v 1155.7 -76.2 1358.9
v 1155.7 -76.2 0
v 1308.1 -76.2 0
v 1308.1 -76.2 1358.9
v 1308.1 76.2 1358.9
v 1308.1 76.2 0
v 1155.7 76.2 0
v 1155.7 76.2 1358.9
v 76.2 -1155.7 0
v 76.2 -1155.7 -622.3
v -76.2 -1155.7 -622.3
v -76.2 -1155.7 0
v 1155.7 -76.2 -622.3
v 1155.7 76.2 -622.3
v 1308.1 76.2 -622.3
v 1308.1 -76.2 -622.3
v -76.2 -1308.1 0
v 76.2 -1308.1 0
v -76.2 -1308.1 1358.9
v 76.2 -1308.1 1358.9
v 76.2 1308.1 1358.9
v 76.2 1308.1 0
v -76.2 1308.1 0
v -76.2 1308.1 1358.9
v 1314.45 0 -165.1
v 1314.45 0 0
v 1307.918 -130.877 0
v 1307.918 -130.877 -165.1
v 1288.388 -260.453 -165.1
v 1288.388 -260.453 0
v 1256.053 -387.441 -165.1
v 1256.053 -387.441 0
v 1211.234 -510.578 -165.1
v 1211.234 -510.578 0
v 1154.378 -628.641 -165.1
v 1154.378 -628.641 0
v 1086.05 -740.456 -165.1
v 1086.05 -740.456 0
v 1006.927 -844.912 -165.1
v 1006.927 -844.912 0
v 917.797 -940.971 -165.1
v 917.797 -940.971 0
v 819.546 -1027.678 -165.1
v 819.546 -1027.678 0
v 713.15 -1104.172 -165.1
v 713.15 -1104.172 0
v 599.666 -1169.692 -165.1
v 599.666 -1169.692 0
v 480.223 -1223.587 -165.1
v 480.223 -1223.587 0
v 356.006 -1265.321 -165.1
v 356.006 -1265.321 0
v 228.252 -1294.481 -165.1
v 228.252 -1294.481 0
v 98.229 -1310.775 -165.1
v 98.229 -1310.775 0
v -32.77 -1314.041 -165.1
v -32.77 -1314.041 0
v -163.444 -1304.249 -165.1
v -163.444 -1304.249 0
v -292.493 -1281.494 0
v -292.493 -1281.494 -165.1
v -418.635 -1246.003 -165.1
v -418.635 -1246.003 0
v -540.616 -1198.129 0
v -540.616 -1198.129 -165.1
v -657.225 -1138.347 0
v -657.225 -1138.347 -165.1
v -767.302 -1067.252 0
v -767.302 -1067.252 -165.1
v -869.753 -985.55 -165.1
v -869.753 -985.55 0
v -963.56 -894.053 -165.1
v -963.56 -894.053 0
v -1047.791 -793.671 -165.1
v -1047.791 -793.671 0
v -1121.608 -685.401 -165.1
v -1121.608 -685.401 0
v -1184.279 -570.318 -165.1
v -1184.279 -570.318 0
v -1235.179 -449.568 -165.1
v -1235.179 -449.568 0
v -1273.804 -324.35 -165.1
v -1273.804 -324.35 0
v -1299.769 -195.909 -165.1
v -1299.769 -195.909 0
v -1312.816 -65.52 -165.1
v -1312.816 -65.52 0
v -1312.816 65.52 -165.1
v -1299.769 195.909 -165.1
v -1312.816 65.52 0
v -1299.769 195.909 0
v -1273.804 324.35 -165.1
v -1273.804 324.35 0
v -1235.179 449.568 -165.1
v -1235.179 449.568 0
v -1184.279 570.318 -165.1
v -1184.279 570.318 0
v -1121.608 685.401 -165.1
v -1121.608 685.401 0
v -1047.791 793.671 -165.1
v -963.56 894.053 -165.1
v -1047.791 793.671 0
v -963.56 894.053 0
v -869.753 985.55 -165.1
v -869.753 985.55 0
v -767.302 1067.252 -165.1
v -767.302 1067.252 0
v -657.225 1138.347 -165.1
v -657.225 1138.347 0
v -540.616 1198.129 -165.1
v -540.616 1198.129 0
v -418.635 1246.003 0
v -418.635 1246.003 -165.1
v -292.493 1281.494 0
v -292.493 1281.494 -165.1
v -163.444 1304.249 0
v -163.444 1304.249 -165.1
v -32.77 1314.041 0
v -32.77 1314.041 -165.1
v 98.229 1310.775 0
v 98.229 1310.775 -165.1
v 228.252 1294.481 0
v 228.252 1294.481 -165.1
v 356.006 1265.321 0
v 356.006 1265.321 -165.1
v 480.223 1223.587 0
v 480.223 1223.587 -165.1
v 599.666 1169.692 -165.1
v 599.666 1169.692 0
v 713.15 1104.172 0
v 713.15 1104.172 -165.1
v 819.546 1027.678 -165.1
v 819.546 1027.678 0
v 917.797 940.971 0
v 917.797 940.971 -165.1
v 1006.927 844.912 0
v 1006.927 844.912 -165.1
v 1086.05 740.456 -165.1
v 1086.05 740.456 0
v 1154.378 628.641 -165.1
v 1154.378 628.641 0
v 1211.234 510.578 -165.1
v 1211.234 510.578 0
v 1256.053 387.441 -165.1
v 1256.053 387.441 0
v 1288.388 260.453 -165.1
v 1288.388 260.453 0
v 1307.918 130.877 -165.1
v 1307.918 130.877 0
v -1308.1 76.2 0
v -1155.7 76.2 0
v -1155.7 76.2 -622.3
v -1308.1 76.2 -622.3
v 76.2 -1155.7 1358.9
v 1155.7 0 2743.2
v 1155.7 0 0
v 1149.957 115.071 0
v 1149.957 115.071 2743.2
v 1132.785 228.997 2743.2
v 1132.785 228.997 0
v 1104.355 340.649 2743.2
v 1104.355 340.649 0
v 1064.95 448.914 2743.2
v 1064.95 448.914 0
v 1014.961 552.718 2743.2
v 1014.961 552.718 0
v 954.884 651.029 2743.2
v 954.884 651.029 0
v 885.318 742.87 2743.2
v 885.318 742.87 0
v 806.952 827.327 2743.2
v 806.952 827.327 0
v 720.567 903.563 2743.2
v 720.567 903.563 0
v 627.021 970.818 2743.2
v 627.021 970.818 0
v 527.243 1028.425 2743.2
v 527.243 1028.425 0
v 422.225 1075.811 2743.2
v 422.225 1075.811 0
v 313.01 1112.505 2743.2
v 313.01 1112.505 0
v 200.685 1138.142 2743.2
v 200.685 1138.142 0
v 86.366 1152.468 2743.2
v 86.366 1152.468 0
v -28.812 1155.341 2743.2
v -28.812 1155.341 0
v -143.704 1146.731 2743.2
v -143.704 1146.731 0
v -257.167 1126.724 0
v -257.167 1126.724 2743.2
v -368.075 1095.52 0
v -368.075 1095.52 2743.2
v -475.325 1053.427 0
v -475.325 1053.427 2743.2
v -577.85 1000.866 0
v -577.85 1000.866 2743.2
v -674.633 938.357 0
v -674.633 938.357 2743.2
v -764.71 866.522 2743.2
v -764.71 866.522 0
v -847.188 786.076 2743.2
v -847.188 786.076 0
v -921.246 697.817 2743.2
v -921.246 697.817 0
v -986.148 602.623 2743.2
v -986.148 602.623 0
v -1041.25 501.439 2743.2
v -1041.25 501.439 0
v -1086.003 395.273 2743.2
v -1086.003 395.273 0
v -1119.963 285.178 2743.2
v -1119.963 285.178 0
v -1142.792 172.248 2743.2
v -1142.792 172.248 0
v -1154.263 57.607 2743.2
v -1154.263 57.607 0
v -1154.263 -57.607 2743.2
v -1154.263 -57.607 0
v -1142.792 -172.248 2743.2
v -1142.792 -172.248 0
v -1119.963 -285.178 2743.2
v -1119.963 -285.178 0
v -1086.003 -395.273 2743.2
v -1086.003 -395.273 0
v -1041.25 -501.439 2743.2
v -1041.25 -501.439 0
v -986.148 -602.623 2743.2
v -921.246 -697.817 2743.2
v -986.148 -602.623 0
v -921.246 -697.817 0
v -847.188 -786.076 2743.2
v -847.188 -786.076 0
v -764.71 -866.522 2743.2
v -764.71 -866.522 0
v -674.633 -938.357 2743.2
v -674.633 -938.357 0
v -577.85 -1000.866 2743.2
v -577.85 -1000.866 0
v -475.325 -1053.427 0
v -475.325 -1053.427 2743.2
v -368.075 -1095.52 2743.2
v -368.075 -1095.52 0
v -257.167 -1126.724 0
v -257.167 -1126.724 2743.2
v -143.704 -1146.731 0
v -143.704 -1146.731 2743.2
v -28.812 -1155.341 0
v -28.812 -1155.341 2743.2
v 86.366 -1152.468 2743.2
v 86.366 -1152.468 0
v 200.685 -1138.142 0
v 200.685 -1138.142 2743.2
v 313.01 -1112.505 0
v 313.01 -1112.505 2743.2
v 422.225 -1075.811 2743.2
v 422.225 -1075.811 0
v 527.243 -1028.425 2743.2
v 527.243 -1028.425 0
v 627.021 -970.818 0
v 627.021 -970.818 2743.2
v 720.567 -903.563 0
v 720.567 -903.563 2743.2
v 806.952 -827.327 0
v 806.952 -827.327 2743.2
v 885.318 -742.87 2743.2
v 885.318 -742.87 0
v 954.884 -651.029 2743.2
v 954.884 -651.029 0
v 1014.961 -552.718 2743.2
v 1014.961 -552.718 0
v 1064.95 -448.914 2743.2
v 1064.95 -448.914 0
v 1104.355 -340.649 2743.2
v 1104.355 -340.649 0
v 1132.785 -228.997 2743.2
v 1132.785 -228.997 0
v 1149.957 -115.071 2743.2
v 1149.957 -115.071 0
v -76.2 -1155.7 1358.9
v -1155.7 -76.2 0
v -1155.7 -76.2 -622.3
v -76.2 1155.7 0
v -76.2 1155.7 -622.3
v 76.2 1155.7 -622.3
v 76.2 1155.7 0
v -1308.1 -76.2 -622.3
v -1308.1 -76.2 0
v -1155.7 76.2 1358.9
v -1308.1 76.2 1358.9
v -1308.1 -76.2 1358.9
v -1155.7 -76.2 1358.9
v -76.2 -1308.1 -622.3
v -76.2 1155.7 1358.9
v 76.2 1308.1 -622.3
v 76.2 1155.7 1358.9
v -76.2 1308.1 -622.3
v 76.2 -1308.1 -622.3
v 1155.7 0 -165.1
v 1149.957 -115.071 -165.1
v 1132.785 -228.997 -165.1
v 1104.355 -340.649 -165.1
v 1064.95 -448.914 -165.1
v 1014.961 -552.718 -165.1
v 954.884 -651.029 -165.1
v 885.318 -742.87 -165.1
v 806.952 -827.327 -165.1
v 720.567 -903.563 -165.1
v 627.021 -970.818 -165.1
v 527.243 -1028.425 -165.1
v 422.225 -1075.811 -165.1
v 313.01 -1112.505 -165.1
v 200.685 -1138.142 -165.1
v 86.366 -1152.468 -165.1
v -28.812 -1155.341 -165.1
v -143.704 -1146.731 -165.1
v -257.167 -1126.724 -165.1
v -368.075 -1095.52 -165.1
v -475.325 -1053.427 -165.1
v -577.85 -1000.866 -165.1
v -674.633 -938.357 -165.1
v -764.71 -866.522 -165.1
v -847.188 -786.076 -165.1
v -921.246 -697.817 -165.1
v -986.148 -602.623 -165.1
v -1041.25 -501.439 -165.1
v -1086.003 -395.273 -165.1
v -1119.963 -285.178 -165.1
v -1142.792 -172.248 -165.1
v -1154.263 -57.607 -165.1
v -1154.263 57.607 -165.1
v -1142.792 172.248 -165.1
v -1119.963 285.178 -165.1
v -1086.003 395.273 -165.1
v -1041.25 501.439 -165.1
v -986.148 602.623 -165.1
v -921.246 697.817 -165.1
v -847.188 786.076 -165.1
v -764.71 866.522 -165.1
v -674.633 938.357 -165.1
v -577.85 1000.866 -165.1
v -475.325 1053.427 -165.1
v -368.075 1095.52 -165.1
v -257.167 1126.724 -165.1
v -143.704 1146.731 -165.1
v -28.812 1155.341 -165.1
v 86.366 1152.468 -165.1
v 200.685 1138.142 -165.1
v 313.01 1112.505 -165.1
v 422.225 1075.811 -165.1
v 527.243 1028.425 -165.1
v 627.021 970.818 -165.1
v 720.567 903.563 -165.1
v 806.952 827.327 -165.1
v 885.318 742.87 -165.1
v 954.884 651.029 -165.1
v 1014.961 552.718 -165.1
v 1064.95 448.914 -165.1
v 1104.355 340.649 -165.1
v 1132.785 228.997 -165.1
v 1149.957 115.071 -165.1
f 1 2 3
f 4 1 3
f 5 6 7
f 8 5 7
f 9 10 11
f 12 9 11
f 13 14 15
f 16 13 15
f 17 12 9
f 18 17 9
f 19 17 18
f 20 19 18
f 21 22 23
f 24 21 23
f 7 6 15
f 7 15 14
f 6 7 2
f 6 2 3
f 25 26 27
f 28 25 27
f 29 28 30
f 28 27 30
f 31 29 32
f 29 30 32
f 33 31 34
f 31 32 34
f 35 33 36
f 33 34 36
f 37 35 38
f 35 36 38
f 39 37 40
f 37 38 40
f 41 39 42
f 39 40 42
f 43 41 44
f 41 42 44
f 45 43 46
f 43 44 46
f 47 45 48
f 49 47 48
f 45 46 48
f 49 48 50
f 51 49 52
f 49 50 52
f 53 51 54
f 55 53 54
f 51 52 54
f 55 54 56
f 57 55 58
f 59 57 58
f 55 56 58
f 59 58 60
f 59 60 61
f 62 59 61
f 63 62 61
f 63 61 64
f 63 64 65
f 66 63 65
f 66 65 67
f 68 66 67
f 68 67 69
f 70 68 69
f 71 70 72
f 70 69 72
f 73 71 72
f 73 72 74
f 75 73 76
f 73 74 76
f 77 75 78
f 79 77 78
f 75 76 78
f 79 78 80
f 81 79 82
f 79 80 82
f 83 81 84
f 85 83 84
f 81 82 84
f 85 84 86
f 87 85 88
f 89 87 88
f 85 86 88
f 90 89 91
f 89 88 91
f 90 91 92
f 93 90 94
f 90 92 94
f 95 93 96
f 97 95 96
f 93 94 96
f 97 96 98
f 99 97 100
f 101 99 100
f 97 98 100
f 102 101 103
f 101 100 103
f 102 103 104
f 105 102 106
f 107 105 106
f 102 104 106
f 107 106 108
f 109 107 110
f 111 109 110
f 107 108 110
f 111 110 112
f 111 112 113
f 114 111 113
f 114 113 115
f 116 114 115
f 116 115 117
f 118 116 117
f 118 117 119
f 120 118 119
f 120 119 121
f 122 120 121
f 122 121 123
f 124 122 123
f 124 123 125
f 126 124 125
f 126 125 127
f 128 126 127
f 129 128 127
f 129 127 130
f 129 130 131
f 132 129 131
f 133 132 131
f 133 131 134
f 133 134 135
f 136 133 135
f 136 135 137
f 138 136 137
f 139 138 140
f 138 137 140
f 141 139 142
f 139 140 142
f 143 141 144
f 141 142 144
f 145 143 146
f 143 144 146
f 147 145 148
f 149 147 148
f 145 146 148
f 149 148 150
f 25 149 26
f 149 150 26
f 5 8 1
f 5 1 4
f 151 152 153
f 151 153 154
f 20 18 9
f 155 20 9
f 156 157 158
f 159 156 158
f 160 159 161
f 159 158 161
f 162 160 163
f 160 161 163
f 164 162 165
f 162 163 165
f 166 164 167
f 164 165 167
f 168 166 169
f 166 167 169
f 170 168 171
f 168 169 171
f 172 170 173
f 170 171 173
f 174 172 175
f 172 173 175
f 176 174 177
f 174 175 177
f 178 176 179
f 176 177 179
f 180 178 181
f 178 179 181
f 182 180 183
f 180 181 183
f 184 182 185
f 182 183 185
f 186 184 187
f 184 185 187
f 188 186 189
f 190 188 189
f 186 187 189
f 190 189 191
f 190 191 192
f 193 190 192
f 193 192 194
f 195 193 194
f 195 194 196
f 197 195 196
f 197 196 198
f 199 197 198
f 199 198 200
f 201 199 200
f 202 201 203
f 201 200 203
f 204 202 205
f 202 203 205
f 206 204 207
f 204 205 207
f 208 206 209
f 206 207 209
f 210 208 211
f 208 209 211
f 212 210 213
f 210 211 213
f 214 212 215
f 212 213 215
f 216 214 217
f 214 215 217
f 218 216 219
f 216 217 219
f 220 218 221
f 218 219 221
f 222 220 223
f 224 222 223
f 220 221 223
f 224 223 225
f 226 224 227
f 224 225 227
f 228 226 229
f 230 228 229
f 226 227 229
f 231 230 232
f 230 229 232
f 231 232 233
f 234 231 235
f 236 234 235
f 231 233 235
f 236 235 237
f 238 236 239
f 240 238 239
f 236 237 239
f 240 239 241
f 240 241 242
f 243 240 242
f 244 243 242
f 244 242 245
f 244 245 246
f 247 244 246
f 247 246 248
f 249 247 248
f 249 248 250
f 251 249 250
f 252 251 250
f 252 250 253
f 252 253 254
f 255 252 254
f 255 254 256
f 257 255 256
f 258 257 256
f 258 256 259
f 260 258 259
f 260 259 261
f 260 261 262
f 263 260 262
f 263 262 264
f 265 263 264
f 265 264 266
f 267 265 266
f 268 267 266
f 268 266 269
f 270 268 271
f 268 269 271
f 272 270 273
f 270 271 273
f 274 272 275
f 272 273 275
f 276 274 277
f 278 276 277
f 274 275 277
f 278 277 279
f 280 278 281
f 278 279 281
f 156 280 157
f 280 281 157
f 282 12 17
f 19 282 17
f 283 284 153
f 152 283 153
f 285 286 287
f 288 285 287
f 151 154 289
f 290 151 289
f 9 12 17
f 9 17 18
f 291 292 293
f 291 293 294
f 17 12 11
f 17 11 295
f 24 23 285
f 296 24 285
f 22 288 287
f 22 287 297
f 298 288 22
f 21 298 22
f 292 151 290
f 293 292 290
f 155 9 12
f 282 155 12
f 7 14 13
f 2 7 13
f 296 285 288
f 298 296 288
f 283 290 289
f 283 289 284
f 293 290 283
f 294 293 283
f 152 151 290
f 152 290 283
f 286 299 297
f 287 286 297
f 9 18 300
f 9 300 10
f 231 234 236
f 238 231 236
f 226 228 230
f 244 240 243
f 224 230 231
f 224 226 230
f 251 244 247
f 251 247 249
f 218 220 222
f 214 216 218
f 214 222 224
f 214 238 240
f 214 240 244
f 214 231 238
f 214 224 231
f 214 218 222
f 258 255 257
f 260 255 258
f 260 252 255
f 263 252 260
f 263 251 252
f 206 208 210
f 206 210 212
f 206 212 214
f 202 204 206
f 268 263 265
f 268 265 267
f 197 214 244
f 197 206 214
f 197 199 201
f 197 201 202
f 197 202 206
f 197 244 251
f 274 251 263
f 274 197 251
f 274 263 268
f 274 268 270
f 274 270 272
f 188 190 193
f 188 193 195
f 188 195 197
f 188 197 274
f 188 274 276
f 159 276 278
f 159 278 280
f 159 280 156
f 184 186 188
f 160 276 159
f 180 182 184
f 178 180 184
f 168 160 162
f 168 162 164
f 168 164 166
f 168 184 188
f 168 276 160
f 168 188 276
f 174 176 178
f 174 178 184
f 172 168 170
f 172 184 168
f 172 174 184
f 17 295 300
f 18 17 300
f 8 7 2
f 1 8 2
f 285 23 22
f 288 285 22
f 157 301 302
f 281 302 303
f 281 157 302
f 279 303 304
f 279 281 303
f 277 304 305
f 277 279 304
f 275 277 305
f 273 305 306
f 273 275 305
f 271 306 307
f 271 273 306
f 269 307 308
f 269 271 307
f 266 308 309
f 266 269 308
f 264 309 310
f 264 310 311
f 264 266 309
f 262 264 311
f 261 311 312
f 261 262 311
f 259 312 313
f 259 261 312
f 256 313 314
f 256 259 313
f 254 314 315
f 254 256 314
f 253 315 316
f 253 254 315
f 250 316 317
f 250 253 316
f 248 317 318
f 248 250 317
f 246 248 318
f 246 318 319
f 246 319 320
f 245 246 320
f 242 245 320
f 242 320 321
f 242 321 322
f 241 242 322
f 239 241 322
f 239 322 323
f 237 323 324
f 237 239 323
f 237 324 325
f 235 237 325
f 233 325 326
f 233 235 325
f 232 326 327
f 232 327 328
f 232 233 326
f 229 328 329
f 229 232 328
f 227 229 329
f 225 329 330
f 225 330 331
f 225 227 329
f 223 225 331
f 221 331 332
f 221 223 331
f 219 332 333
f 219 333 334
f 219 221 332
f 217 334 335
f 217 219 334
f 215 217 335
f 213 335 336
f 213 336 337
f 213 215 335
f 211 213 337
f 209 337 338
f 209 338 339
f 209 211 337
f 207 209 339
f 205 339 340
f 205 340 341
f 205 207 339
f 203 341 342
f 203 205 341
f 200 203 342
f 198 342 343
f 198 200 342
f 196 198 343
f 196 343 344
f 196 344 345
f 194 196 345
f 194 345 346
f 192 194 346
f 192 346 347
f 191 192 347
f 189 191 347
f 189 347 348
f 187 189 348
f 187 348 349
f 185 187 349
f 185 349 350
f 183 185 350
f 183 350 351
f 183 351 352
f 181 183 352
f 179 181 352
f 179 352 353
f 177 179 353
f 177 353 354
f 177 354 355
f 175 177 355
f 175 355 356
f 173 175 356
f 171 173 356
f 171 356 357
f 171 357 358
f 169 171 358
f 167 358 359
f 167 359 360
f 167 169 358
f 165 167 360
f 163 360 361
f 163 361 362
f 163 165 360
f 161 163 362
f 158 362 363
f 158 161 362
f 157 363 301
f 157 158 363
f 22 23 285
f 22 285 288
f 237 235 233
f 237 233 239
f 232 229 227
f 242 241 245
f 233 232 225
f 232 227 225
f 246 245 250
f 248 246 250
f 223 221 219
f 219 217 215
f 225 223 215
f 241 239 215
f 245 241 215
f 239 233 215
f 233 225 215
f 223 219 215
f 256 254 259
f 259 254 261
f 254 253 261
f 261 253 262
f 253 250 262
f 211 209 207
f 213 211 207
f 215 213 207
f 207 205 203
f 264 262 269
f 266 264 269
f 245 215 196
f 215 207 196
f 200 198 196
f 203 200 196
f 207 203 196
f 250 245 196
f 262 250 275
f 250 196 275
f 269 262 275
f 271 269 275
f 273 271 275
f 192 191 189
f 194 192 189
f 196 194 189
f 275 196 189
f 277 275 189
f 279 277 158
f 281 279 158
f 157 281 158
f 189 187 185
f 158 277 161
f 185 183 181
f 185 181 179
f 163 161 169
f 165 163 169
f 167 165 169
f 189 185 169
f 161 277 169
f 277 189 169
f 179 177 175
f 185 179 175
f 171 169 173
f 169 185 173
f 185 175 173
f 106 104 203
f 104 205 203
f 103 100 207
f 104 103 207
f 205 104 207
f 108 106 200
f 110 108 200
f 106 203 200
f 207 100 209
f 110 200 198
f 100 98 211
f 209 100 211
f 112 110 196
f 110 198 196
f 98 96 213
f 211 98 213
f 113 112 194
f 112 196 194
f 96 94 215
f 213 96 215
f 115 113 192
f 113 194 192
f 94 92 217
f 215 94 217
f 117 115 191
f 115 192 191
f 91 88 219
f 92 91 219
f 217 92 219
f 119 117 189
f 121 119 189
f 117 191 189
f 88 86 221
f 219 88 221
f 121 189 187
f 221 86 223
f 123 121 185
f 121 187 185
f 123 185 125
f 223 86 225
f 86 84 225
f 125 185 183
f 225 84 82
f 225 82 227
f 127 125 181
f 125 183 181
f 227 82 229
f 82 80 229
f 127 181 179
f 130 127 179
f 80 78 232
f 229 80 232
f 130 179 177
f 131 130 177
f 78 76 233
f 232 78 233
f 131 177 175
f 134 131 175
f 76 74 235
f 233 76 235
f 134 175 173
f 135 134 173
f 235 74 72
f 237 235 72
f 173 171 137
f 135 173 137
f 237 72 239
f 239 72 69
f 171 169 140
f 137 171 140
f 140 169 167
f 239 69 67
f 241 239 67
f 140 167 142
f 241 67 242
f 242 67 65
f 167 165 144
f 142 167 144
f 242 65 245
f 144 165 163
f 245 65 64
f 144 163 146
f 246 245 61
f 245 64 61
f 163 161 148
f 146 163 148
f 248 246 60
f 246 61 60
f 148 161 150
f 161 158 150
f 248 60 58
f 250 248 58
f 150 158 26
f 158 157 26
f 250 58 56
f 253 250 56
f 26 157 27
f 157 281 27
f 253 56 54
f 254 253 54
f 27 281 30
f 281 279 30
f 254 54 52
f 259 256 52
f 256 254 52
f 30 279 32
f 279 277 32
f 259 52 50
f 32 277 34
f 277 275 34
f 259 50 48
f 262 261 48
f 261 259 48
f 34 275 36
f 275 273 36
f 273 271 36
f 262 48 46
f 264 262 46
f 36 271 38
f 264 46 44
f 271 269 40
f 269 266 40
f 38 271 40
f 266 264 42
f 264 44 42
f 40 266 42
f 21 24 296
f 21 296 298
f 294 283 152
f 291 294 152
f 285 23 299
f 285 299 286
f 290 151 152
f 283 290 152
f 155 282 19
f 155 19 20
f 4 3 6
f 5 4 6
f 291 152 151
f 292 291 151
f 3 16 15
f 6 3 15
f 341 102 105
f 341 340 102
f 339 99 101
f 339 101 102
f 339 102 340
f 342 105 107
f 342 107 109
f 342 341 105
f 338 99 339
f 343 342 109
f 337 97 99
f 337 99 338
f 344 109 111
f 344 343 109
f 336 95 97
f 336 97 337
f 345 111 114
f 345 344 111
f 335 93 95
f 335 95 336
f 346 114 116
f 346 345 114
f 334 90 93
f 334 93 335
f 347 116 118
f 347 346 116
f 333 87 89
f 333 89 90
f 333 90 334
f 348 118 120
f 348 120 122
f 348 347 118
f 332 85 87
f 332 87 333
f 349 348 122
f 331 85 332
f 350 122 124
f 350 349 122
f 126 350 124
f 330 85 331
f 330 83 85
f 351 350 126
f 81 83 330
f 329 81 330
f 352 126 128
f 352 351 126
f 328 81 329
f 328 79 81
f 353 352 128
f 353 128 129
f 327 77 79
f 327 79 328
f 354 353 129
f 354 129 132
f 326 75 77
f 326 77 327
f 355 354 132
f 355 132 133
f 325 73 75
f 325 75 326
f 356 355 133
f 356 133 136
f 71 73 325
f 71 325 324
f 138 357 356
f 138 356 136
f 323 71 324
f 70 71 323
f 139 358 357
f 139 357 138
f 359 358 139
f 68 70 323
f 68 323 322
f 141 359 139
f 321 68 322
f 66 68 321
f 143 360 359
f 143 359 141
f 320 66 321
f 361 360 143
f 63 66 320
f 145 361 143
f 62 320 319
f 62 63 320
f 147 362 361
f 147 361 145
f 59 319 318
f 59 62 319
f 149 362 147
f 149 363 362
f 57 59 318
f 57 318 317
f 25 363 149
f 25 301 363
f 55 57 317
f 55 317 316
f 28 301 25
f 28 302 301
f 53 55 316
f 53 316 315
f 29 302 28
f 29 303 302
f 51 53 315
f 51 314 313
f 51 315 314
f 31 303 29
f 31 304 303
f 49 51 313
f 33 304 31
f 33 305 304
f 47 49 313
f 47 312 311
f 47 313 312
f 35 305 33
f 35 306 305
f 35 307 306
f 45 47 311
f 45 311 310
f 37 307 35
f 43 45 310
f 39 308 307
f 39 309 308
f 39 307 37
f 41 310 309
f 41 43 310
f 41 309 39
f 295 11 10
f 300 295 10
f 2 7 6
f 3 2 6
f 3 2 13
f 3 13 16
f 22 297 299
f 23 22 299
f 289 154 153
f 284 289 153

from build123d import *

# Parameters (mm, degrees)
F0_R     = 1155.7
F1_DEPTH = 2743.2
F2_R     = 1314.45
F2_R_2   = 1155.7
F3_DEPTH = 165.1
F5_DEPTH = 1358.9
F6_DEPTH = 622.3


with BuildPart() as f1:
    # F0 (on Top) → F1 (new body)
    with BuildSketch(Plane.XY):
        Circle(F0_R)
    extrude(amount=F1_DEPTH)


with BuildPart() as f3:
    # F2 (on face) → F3 (new body)
    with BuildSketch(Plane(origin=(0, 0, 0), x_dir=(1, 0, 0), z_dir=(0, 0, -1))):
        Circle(F2_R)
        Circle(F2_R_2, mode=Mode.SUBTRACT)
    extrude(amount=F3_DEPTH)


with BuildPart() as f5:
    # F4 (on face) → F5 (new body)
    with BuildSketch(Plane.XY):
        Polygon((-1155.7, 0), (-1155.7, 76.2), (-1308.1, 76.2), (-1308.1, 0), (-1308.1, -76.2), (-1155.7, -76.2), align=None)
        Polygon((76.2, -1308.1), (76.2, -1155.7), (0, -1155.7), (-76.2, -1155.7), (-76.2, -1308.1), (0, -1308.1), align=None)
        Polygon((1308.1, 76.2), (1155.7, 76.2), (1155.7, 0), (1155.7, -76.2), (1308.1, -76.2), (1308.1, 0), align=None)
        Polygon((-76.2, 1308.1), (-76.2, 1155.7), (0, 1155.7), (76.2, 1155.7), (76.2, 1308.1), (0, 1308.1), align=None)
    extrude(amount=F5_DEPTH)


with BuildPart() as f6:
    # F4 (on face) → F6 (new body)
    with BuildSketch(Plane.XY):
        Polygon((-1155.7, 0), (-1155.7, 76.2), (-1308.1, 76.2), (-1308.1, 0), (-1308.1, -76.2), (-1155.7, -76.2), align=None)
        Polygon((76.2, -1308.1), (76.2, -1155.7), (0, -1155.7), (-76.2, -1155.7), (-76.2, -1308.1), (0, -1308.1), align=None)
        Polygon((1308.1, 76.2), (1155.7, 76.2), (1155.7, 0), (1155.7, -76.2), (1308.1, -76.2), (1308.1, 0), align=None)
        Polygon((-76.2, 1308.1), (-76.2, 1155.7), (0, 1155.7), (76.2, 1155.7), (76.2, 1308.1), (0, 1308.1), align=None)
    extrude(amount=-F6_DEPTH)


solid = Compound([f1.part, f3.part, f5.part, f6.part])
